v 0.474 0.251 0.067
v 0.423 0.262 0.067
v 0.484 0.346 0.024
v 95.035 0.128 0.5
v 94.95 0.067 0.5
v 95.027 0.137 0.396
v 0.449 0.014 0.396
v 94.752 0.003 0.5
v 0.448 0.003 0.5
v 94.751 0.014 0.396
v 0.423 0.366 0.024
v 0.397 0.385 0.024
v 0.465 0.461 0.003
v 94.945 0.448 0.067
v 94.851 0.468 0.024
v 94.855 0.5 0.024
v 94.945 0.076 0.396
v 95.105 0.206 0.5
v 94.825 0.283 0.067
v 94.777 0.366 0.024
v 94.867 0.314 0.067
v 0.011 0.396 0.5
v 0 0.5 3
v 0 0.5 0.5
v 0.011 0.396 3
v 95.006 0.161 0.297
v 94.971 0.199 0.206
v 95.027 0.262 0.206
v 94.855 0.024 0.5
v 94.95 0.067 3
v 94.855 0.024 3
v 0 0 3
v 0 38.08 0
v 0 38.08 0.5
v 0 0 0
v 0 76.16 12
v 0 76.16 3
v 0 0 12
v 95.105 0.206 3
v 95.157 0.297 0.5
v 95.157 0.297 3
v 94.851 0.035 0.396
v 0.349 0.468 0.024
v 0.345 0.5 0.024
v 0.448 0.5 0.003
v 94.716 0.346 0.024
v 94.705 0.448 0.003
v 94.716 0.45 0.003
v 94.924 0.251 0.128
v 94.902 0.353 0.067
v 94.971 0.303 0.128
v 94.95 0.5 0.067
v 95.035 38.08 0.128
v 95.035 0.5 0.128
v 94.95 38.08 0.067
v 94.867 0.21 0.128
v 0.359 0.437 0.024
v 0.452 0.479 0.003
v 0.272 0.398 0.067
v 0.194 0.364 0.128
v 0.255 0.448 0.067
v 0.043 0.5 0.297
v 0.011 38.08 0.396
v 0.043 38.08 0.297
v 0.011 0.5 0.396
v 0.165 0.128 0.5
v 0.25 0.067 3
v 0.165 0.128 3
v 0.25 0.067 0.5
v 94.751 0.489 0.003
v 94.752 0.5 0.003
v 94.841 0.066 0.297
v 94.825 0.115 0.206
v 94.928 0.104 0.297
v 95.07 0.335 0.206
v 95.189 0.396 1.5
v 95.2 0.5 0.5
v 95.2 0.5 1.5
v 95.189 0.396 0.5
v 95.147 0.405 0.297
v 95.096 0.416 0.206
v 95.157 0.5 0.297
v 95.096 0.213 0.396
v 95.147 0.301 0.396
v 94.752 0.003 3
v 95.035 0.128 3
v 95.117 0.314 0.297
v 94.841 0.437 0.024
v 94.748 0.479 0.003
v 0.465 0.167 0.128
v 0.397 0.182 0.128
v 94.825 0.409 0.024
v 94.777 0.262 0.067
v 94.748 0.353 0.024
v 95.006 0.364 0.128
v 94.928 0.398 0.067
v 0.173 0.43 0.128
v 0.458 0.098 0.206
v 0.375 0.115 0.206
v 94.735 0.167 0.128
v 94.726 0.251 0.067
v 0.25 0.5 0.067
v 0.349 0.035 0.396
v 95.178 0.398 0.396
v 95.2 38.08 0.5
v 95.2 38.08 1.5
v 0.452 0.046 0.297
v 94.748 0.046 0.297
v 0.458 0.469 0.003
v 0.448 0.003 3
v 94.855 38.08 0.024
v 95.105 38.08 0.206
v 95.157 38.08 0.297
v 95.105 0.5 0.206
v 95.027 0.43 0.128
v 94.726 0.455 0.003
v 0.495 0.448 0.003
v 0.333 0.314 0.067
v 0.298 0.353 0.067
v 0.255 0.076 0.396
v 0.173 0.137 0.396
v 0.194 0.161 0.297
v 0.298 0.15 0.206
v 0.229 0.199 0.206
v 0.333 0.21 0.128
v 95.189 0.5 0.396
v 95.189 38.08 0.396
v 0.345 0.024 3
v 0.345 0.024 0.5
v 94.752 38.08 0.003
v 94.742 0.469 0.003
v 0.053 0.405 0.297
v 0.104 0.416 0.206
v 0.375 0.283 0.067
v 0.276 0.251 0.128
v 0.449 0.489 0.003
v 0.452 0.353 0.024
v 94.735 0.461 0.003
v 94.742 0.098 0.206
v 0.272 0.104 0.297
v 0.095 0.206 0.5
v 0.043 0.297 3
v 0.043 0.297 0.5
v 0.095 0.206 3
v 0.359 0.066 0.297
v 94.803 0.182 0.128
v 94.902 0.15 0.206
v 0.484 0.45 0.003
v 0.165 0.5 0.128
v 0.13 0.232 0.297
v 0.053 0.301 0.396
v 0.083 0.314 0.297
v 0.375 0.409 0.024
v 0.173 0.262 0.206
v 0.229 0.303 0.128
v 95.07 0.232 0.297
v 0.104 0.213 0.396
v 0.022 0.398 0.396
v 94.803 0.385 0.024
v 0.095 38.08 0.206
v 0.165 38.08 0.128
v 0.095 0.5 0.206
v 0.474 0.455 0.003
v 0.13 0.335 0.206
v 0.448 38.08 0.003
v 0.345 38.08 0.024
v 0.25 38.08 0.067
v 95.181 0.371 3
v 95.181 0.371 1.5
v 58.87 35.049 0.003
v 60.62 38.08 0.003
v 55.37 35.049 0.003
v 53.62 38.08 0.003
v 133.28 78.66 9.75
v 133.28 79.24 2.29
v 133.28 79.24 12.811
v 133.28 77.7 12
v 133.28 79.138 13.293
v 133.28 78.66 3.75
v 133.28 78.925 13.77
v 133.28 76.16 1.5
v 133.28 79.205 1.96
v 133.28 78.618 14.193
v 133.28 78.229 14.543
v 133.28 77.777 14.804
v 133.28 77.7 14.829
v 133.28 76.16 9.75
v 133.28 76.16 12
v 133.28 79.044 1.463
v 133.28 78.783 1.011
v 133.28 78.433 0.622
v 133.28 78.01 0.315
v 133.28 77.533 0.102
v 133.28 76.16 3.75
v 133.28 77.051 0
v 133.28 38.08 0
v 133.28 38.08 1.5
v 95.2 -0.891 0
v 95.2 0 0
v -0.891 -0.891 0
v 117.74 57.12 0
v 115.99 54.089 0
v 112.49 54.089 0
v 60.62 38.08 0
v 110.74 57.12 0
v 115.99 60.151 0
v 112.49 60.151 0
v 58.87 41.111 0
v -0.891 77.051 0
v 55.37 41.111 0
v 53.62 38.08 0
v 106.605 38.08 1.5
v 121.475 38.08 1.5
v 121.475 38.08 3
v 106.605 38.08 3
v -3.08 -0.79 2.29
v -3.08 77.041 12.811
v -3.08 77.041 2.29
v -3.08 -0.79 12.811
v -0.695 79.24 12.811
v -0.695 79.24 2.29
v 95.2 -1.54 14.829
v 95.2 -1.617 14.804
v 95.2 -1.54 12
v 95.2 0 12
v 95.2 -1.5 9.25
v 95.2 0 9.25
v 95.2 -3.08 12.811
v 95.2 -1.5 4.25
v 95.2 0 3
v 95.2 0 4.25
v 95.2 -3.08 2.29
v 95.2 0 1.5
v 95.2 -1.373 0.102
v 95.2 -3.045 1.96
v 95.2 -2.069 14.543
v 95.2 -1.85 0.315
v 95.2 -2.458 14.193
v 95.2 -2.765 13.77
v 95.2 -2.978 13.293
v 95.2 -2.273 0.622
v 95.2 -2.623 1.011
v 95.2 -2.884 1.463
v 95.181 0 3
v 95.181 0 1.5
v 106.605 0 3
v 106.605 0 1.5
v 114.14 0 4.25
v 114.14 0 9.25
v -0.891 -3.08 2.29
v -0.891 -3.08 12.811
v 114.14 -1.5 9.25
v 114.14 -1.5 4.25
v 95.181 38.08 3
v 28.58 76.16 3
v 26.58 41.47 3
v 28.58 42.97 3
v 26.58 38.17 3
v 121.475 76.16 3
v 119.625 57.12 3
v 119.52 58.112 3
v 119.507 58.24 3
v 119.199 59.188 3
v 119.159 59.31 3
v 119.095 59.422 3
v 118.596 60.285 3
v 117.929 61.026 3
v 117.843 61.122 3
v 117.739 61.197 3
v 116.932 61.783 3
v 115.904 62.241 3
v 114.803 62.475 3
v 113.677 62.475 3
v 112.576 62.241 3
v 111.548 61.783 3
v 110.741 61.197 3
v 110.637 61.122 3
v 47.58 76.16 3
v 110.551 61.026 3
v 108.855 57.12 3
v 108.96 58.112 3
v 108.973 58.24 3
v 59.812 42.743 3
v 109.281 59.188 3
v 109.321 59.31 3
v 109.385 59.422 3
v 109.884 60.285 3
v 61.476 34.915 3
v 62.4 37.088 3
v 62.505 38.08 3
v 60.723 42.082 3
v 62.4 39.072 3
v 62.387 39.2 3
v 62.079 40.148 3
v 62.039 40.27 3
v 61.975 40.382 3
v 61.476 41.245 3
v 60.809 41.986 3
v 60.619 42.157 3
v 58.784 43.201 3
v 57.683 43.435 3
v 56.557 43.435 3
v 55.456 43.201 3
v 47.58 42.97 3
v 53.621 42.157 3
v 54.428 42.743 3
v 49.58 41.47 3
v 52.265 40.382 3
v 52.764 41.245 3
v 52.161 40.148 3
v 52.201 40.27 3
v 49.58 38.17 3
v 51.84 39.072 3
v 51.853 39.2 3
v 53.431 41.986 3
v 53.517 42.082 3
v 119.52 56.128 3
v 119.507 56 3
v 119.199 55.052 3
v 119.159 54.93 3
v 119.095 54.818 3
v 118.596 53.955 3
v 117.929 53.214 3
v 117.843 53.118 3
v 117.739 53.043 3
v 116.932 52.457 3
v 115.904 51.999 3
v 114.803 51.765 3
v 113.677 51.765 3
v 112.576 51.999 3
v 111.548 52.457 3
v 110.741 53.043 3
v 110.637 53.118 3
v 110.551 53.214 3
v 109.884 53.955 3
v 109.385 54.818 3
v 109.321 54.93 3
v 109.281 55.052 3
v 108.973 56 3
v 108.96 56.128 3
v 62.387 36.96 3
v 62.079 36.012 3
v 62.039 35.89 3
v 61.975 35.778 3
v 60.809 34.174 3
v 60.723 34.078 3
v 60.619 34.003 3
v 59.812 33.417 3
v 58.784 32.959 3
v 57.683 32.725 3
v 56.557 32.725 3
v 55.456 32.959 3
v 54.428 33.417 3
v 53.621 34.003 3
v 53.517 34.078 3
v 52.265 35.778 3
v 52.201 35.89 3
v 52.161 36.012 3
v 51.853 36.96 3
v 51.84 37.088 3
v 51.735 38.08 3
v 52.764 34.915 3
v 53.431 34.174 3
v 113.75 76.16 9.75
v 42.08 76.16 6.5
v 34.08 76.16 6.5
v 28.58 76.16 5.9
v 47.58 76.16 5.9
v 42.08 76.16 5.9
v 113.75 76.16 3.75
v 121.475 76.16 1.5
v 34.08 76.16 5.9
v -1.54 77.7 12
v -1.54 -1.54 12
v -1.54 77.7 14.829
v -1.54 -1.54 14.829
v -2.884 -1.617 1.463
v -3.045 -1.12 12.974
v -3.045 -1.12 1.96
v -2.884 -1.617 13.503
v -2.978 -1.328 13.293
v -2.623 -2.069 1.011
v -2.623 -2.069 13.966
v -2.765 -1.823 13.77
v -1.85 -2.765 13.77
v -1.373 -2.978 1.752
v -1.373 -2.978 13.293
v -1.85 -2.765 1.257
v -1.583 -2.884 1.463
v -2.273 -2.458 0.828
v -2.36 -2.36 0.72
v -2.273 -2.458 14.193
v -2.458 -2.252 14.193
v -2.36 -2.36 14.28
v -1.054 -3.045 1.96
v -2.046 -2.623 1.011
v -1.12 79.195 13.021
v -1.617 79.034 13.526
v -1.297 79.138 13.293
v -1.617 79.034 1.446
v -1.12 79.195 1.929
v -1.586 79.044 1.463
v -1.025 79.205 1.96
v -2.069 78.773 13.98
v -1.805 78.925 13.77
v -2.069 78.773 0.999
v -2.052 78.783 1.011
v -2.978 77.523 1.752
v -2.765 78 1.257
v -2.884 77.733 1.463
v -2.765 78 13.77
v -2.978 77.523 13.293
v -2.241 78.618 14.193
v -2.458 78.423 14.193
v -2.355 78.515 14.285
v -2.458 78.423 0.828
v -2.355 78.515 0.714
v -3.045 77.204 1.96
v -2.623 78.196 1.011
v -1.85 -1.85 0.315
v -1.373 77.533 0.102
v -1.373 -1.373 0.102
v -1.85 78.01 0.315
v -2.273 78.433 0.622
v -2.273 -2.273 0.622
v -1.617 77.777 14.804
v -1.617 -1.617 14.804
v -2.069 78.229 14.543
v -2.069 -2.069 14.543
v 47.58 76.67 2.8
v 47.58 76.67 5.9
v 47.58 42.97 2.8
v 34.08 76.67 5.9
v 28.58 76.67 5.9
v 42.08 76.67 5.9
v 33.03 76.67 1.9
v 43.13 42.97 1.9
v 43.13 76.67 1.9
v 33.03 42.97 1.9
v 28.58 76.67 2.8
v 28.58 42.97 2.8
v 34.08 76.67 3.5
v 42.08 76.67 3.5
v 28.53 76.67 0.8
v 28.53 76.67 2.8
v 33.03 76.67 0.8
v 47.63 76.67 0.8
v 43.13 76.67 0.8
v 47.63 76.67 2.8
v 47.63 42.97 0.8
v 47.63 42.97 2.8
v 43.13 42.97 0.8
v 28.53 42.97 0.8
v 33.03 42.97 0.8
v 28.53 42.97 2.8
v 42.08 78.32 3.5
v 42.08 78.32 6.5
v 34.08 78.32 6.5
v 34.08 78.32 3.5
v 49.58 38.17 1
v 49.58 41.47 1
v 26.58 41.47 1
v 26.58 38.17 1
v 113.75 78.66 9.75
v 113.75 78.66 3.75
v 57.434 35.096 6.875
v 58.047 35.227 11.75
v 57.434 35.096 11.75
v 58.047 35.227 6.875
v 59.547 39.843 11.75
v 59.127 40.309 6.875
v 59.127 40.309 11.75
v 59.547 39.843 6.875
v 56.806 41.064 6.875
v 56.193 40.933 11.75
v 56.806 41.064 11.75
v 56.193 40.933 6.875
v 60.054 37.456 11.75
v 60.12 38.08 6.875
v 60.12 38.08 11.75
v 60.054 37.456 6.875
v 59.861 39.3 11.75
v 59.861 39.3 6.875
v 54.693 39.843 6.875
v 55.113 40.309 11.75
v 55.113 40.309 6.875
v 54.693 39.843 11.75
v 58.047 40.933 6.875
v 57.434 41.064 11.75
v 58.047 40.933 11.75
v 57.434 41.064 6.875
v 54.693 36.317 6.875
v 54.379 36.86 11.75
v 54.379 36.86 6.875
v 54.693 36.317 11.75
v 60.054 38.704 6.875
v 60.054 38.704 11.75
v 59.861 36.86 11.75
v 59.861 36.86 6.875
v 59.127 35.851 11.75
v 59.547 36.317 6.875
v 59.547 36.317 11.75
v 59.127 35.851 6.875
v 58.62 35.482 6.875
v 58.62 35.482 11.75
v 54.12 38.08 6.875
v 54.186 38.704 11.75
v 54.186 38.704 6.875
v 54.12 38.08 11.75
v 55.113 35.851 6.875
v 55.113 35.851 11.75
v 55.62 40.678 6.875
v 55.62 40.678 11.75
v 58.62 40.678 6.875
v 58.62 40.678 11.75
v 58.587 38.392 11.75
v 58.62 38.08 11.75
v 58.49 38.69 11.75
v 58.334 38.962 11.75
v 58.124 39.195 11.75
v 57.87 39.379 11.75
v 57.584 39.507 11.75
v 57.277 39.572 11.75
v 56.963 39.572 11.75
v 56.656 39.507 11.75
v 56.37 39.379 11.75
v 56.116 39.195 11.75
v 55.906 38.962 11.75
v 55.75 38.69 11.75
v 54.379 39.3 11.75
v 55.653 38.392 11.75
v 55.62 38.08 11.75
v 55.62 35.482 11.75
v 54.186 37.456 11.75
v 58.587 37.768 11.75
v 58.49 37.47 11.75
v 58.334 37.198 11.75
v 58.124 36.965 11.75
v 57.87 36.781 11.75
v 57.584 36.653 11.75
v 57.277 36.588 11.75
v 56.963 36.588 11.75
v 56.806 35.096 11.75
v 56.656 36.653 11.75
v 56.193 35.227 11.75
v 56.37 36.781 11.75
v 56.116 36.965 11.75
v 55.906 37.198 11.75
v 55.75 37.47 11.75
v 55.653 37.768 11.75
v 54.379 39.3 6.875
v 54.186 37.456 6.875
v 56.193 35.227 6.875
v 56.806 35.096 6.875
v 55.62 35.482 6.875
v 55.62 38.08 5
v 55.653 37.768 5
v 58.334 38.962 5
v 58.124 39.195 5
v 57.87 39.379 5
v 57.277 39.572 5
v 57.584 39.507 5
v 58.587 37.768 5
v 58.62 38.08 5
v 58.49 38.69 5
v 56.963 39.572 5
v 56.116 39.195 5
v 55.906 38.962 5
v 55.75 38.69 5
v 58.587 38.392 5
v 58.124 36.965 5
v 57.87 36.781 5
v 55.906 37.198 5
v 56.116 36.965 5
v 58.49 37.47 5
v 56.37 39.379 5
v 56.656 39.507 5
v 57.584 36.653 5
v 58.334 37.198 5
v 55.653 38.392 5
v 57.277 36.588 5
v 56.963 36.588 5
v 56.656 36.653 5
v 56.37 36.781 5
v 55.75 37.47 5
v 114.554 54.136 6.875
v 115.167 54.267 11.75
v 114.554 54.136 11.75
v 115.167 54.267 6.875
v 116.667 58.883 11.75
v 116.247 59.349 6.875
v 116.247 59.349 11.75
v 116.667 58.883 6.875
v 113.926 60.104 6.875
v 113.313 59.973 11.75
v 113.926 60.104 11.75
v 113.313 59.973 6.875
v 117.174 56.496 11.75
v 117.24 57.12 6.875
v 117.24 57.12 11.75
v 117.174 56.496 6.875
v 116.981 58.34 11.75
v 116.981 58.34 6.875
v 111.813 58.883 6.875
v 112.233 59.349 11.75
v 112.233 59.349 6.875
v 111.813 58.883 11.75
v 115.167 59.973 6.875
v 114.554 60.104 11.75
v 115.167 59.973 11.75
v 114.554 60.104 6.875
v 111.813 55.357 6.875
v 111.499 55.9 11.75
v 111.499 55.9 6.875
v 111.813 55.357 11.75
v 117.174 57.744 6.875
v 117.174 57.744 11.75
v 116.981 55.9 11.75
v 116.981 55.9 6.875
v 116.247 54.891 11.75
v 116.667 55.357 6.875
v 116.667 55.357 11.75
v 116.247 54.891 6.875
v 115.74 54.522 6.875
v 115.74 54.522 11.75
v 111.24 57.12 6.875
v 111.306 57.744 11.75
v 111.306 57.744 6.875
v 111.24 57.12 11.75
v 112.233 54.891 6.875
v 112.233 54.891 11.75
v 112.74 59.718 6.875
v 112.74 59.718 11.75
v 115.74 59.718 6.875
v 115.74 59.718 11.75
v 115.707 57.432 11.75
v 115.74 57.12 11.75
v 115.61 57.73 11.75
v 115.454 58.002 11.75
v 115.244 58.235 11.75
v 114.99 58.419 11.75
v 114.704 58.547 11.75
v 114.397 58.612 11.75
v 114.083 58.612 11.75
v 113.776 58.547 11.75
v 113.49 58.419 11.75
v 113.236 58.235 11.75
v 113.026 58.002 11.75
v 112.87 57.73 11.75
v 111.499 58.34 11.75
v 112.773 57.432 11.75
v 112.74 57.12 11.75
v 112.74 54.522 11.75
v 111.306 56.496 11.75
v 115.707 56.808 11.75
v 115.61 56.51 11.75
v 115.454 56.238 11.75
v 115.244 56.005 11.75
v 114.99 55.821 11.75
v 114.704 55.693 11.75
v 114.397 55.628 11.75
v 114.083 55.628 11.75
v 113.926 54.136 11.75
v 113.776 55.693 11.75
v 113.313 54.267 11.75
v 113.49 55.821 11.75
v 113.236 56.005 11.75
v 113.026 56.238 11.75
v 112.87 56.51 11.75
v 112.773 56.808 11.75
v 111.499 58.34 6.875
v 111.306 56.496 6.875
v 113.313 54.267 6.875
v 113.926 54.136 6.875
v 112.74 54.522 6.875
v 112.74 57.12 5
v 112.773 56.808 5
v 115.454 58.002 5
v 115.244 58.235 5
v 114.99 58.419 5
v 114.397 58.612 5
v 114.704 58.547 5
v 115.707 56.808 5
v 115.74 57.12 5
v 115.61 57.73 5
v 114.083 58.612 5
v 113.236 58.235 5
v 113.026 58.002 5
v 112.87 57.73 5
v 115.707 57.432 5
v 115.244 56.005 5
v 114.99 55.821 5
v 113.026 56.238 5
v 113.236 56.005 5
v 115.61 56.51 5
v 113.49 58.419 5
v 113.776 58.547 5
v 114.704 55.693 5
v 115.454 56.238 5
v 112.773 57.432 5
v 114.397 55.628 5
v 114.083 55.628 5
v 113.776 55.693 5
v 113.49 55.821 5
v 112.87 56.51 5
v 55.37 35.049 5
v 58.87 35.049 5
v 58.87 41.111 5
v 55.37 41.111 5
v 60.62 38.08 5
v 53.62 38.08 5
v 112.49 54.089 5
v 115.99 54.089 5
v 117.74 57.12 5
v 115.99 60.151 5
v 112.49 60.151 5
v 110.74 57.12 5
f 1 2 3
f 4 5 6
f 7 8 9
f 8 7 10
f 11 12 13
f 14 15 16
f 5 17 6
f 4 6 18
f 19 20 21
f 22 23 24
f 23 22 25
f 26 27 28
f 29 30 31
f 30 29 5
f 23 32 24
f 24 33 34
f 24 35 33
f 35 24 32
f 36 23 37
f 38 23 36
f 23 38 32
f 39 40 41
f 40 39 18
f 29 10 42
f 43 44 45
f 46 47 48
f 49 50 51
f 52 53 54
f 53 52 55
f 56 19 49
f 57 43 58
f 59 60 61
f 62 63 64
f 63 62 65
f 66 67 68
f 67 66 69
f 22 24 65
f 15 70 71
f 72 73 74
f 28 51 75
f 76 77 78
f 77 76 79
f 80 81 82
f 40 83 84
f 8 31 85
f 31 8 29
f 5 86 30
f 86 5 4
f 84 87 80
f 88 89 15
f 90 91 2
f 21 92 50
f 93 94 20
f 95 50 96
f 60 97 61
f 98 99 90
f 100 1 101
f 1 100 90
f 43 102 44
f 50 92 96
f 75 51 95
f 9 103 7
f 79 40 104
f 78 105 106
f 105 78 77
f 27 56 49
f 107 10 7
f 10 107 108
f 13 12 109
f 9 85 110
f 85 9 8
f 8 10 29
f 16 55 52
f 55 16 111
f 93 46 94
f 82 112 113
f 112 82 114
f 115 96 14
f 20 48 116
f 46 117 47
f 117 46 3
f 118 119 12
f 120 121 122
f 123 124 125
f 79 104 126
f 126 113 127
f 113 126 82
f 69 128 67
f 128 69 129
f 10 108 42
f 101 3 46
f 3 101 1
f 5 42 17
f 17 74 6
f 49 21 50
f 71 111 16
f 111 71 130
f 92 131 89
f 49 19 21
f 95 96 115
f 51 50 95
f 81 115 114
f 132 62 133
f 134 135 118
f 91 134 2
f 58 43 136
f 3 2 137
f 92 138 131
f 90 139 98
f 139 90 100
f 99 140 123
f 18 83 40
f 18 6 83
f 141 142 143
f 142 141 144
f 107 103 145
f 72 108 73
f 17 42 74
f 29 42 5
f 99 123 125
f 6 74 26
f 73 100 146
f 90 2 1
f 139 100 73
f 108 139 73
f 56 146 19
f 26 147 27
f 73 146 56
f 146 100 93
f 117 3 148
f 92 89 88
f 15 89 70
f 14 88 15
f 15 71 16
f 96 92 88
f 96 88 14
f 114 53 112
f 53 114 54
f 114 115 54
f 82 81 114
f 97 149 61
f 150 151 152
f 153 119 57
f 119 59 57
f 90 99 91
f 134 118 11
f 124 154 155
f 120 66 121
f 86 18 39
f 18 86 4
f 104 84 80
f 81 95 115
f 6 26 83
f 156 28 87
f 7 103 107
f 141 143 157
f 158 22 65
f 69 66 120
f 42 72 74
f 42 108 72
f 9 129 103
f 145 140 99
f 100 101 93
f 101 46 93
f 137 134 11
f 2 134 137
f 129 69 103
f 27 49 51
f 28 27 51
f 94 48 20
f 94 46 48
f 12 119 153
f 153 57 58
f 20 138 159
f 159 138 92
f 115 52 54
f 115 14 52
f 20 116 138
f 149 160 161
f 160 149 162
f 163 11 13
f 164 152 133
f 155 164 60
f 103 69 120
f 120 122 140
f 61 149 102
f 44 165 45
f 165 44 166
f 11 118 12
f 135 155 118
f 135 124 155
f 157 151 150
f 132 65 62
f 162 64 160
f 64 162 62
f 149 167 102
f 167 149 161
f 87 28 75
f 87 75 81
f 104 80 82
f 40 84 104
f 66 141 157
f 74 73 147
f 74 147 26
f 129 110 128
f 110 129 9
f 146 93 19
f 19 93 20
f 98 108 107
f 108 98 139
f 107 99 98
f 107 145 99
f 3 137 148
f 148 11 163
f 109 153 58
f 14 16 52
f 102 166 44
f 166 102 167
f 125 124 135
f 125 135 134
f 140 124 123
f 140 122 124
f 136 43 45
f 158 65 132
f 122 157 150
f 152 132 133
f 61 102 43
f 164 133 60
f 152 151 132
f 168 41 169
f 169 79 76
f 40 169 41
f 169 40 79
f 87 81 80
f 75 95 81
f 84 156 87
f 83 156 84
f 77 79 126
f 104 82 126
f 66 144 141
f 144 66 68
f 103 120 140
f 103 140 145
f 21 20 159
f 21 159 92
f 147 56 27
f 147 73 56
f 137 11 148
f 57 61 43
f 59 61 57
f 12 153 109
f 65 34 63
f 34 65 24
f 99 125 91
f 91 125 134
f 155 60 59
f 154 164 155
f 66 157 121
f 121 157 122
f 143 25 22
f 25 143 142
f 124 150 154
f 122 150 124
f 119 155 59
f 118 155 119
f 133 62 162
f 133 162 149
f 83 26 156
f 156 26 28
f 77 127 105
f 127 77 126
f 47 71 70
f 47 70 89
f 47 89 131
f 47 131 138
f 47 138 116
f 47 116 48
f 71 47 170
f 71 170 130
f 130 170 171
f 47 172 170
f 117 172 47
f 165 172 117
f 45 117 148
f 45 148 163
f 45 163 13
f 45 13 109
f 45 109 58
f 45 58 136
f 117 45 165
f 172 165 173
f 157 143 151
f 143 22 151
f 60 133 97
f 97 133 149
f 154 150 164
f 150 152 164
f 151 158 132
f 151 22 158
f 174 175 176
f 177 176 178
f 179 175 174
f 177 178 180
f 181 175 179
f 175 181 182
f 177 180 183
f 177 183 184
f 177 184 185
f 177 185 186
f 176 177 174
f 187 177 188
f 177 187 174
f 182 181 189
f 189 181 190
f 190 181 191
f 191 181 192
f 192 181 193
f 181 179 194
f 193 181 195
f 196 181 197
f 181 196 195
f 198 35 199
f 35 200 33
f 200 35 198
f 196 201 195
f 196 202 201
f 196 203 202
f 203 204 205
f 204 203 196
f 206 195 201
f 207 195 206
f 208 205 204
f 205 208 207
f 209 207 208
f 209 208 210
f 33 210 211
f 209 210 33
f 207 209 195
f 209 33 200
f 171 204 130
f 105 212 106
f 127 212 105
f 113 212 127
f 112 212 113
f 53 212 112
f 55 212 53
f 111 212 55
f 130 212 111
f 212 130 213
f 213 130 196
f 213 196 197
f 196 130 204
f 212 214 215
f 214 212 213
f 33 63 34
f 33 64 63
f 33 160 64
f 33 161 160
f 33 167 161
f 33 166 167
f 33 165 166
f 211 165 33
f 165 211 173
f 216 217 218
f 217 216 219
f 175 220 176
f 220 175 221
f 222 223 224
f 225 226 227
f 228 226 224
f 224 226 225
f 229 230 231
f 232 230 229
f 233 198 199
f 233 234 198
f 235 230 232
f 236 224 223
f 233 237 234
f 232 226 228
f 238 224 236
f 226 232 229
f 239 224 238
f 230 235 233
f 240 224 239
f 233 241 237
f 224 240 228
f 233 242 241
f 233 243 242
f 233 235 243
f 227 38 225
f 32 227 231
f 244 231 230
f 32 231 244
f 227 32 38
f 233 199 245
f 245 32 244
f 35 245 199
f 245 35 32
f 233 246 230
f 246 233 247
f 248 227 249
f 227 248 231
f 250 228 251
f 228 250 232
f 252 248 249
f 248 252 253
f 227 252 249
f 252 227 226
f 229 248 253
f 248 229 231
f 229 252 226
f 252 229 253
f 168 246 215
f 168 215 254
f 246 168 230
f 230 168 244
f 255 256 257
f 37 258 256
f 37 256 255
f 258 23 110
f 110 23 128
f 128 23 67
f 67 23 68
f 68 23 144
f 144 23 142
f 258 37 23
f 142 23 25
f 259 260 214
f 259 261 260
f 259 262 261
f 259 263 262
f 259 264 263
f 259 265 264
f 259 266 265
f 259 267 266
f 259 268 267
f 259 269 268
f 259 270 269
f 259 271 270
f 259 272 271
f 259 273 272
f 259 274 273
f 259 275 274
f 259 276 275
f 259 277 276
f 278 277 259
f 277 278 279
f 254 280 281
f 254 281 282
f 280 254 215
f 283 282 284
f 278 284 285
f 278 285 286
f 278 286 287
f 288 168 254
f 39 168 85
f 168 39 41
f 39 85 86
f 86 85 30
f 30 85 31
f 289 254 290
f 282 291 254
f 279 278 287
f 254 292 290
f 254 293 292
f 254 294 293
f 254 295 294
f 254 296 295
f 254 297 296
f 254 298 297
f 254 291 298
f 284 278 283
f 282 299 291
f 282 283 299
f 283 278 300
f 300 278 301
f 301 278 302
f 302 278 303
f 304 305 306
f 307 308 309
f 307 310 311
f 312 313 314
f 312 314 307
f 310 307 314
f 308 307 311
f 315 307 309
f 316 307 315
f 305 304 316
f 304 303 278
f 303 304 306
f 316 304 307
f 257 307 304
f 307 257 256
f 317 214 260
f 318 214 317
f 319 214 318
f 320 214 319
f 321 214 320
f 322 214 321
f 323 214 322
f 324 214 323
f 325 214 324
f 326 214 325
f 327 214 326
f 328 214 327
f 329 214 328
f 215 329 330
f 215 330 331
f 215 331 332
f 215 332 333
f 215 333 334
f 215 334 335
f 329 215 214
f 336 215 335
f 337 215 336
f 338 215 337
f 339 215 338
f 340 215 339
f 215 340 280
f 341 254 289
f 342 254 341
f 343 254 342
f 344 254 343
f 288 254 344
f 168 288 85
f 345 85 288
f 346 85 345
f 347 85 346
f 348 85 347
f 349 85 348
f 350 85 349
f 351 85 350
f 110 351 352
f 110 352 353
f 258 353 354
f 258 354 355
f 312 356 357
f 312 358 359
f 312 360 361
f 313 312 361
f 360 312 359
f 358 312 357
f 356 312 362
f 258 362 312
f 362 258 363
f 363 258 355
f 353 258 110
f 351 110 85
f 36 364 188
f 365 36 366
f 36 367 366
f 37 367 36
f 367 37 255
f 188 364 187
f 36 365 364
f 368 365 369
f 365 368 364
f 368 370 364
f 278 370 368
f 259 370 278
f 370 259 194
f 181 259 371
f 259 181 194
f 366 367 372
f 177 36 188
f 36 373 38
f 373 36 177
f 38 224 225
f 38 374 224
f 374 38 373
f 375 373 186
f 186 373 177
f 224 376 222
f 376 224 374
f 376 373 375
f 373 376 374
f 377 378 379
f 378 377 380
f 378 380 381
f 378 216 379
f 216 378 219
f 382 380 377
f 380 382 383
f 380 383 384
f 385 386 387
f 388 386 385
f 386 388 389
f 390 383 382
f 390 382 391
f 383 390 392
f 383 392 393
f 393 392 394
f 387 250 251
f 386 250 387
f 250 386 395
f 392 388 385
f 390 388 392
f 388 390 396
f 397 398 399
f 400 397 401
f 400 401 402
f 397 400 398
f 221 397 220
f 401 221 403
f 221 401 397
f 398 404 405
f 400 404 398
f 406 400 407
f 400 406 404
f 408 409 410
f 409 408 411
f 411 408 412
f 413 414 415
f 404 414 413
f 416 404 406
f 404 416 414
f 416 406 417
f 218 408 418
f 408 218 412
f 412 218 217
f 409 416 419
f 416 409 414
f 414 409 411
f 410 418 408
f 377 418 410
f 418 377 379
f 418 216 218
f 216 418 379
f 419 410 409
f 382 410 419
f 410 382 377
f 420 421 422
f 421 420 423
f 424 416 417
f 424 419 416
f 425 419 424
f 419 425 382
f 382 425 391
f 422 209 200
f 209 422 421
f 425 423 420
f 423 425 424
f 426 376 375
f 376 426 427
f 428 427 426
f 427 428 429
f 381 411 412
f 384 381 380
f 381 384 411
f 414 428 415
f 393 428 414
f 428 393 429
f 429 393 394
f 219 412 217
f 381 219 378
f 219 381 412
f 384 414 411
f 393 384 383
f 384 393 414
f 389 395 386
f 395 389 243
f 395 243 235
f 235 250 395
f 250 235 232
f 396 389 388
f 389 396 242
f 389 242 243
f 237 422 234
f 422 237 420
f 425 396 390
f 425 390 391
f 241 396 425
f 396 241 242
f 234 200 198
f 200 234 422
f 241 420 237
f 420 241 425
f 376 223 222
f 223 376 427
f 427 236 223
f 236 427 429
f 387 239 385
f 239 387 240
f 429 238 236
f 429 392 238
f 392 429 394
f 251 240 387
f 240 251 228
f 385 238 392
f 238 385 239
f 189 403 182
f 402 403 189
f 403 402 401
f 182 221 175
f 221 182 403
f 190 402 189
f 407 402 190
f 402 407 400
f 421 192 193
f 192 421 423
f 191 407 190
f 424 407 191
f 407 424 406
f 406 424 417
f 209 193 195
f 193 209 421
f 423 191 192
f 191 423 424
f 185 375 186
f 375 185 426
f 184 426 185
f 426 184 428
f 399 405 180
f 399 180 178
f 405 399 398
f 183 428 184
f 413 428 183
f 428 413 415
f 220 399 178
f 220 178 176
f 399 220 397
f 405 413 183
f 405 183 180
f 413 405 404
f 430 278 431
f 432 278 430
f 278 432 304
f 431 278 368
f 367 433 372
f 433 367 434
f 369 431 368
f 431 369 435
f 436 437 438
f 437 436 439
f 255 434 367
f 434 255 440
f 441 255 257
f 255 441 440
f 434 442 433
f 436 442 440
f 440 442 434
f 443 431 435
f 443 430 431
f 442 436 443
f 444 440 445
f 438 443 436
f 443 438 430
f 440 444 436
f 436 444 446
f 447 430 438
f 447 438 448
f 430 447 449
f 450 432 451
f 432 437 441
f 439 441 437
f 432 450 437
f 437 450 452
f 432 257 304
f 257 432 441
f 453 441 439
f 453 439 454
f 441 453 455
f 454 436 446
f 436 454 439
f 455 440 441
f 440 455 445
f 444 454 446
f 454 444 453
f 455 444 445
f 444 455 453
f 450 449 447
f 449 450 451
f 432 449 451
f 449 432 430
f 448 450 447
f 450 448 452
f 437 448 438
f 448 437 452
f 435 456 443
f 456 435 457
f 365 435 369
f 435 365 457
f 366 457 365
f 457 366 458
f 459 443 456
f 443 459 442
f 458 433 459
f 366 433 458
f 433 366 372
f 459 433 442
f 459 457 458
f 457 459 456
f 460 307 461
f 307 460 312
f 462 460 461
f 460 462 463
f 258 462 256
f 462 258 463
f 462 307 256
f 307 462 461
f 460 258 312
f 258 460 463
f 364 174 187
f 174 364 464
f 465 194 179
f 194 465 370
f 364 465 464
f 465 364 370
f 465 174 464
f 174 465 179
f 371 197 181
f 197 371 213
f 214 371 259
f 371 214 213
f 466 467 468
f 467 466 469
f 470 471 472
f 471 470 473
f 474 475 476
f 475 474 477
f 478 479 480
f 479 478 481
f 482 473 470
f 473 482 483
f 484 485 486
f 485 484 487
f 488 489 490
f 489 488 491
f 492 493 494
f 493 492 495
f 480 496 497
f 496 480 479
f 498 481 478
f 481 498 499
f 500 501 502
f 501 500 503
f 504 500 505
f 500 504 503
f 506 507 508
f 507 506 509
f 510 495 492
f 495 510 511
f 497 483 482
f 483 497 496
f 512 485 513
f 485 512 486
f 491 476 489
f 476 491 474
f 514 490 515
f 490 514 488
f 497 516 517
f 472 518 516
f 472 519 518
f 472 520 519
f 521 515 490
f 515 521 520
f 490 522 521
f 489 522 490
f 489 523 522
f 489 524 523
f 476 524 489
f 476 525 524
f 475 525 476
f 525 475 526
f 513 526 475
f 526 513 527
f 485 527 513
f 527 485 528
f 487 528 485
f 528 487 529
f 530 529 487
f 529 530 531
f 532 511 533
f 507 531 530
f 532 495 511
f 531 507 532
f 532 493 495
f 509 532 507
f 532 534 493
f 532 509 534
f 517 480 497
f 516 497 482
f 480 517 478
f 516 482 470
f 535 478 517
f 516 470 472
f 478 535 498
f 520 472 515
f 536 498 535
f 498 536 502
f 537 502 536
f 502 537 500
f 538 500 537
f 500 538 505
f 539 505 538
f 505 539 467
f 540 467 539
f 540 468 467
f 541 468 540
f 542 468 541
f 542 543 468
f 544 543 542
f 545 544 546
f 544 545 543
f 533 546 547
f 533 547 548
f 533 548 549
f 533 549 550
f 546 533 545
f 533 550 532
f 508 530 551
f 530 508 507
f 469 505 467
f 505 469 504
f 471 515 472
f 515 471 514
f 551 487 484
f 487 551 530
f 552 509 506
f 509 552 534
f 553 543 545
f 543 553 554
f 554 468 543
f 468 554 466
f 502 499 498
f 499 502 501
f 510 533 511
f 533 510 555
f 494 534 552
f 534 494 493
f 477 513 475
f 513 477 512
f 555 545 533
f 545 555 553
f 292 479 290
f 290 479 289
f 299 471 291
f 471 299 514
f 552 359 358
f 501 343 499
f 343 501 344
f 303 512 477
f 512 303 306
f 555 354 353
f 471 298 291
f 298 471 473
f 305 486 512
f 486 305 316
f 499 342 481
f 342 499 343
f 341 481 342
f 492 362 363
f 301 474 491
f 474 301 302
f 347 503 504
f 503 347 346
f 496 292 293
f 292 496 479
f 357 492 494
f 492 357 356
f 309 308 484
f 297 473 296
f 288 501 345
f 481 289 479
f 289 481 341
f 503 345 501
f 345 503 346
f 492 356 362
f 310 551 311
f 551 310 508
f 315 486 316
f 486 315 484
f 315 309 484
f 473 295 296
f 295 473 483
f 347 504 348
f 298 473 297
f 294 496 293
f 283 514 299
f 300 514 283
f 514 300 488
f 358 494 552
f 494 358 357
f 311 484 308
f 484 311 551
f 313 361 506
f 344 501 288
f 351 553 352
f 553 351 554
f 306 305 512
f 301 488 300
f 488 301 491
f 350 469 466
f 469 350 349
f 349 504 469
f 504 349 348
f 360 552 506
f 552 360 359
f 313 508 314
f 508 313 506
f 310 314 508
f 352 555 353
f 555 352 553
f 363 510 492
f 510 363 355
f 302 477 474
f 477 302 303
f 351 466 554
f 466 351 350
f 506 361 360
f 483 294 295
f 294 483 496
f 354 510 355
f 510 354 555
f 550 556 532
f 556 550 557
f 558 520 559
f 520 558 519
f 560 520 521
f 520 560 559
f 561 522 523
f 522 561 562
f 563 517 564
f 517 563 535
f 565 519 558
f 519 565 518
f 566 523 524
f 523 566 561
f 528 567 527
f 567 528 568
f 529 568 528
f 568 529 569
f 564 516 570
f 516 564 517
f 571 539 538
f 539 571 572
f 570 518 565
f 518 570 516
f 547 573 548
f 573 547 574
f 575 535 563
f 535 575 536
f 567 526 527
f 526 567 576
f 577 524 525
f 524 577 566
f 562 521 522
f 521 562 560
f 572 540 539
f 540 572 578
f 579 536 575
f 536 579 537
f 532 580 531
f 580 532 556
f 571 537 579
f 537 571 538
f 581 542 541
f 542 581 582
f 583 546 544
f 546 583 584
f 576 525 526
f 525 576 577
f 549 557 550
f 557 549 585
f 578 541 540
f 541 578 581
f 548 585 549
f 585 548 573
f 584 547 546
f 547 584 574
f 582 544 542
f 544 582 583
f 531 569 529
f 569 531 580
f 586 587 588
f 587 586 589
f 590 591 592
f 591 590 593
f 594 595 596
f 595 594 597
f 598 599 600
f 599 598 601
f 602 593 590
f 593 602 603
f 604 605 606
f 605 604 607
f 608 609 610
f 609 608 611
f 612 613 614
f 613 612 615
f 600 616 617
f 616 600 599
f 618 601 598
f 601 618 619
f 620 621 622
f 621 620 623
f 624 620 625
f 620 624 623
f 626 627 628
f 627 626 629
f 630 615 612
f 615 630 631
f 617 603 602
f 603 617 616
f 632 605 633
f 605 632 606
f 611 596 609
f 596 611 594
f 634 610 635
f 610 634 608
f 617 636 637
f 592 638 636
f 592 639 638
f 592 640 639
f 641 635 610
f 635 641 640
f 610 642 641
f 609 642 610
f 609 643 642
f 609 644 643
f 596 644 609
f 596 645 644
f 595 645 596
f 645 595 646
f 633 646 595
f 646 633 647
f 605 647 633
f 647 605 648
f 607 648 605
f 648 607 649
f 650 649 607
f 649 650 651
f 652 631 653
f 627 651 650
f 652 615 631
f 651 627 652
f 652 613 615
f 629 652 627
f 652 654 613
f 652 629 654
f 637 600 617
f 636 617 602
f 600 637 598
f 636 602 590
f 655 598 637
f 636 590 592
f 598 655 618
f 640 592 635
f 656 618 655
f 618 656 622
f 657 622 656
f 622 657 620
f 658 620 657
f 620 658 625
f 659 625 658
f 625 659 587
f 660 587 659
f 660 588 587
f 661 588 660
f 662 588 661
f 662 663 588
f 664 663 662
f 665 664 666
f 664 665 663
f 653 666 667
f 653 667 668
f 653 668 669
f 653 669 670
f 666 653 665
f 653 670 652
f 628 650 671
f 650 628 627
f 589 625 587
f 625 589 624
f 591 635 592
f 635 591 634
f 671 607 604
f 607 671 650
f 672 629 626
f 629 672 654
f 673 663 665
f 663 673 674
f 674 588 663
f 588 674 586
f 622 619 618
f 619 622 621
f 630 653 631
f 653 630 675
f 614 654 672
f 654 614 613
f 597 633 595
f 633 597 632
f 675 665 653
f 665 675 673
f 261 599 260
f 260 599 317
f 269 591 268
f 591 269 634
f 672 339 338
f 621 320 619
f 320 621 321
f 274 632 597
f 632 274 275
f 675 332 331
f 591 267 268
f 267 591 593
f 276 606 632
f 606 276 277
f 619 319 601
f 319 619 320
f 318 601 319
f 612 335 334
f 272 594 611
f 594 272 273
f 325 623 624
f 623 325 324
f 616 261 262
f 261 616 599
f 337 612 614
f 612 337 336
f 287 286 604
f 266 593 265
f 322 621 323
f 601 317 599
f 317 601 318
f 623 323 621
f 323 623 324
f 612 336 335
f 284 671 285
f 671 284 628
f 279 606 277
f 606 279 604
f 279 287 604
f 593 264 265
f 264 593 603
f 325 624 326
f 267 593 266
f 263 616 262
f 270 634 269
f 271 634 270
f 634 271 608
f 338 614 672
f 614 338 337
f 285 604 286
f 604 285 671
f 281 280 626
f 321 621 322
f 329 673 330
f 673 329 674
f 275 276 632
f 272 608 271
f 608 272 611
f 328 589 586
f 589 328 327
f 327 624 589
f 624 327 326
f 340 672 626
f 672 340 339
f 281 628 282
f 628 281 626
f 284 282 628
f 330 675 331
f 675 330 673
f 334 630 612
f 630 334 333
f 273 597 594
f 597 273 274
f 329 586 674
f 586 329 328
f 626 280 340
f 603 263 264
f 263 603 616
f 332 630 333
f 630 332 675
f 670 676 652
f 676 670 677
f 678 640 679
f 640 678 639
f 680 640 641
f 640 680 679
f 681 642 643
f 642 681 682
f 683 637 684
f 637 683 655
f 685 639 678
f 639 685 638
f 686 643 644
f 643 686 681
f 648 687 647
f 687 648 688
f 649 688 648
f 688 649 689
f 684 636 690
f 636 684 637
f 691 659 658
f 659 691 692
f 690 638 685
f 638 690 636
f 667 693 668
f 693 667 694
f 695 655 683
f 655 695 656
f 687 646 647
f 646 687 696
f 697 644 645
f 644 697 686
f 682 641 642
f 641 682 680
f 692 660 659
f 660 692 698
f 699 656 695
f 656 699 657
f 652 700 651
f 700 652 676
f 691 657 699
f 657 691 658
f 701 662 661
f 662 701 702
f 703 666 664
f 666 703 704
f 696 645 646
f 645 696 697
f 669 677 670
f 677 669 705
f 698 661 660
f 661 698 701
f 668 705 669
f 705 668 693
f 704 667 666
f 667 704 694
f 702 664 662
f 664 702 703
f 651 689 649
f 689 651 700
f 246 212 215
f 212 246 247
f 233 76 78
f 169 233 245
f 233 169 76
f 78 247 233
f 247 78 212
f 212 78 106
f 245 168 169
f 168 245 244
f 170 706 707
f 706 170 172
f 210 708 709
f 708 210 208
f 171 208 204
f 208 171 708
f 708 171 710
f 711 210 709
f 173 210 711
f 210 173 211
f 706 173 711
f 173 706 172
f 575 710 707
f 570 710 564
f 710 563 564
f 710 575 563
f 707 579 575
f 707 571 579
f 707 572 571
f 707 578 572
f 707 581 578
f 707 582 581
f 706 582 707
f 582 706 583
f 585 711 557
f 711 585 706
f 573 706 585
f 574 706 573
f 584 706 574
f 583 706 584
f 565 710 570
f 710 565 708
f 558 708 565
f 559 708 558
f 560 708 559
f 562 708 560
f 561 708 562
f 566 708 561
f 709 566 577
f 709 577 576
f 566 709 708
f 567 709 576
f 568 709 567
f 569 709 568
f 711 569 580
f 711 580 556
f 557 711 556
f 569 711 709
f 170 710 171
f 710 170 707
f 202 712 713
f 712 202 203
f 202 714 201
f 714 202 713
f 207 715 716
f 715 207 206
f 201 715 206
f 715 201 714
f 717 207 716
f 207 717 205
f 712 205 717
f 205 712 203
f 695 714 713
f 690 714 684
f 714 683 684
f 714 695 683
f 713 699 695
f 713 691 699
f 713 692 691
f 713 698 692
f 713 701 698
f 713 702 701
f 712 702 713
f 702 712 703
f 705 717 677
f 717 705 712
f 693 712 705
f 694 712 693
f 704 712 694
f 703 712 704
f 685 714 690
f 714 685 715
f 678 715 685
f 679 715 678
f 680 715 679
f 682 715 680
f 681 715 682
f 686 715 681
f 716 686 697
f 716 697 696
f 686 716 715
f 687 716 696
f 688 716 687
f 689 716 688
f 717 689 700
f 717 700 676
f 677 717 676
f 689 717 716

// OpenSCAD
showSwitchCut=true;
showSwitch=true;
showKeyCap=false;
showSpaceBox=false;
fullboard=false;
space=19.04;

/*[Cherry MX settings]*/
cherryCutOutSize=13.9954;
cherrySize=14.58;

/*[Keeb]*/
keyCols = 12;
keyRows = 4;
keySpace = space-cherrySize;
edgeSpaceAddition = 3;
edgeSpace = (edgeSpaceAddition*2)-keySpace;
keyZ = -1;

function size(q) = (keySpace*q)
                        +cherrySize
                        *(q-1)
                        +cherrySize;
function Qsize(q) = (edgeSpace+edgeSpaceAddition)
              +(keySpace*q)
              +cherrySize
              *(q-1)
              +cherrySize;
          
moduleX = size(keyCols);
moduleY = size(keyRows);
moduleZ = 3;

$fn=30;
$fs=0.15;
mSize=3;


/*[ Printer settings ]*/
showPrintBox=false;
printerSize=[140,140,140];

// mX: h=mX-1, d= X*(1+((1/3)*2))
function mNutH(m) = m-1;
function mNutD(m) = m*(1+((1/3)*2));
function mNutDHole(m) = mNutD(m)+2;
function mScrewheadH(m) = m-1;
function mScrewheadD(m) = m+2; // This is most probably not correct, but works for m3

          
function position(x,y,z) = [space*(x-1), space*(y-1), z];



///////////////////////////////
//  Lib modules
//////////////////////////////

// ---- Key related "libs" ----
module cherrySwitch(){
	// Awesome Cherry MX model created by gcb
	// Lib: Cherry MX switch - reference
	// Download here: https://www.thingiverse.com/thing:421524
	//  p=cherrySize/2+0.53;
	#translate([cherryCutOutSize/1.5,cherryCutOutSize/1.5,13.32])
		import("switch_mx.stl");
}
module cherryCap(x=cherryCutOutSize/1.36,y=cherryCutOutSize/1.36,z=4, capSize=1, homing=false,rotateCap=false){
	// Awesome caps created by rsheldiii
	// Lib: KeyV2: Parametric Mechanical Keycap Library
	// Download here: https://www.thingiverse.com/thing:2783650

  capRotation = rotateCap ? 90 : 0;

	if(capSize == 1){
		translate([x-0.819,y-0.8,z+3.5])rotate([0,0,capRotation]){
      if(homing){
        rotate([0,0,180])import("keycap-dsa-1.0-row3-homing-cherry.stl");
      } else {
        import("keycap-dsa-1.0-row3-cherry.stl");
      }
    }
	} else if(capSize==1.25){

		translate([x-0.819,y-0.8,z+3.5])
    rotate([0,0,capRotation])
			import("keycap-dsa-1.25-row3-cherry.stl");
	}
}

module proMicro(pins=true){
  #translate([size(2),size(keyRows-1)+2.2,moduleZ-0.6])
  if(pins){
    import("pro-micro_wpins.stl");
  } else {
    import("pro-micro.stl");
  }
}

module proMicroHolder(type="holder"){
  translate([size(2),size(keyRows-1)+2.7,moduleZ])
  if(type == "holder"){
    difference(){
      import("pro-micro-holder_base.stl");
//      translate([0,-2.25,1.5])cube([23,38.5,3],center=true);
    }
  } else if(type == "cutout"){
    union(){
      translate([0,0,0.9])cube([19,33.7,4], center=true);
      translate([-7.3,0,-1.2])cube([4.5,33.7,2], center=true);
      translate([7.3,0,-1.2])cube([4.5,33.7,2], center=true);
      translate([0,17,2])cube([8,3,3], center=true);
      translate([0,-20,-0.5])cube([23,3.3,3],center=true);
    }
  } else if(type == "lid"){
    union(){
      translate([0,-3,2.8])cube([10,32,1],center=true);
      translate([0,-18,2])cube([22,2,2.6],center=true);
    }
  }
}

// ---- Keyboard basics ----
module mxSwitchCut(x=cherryCutOutSize/1.5,y=cherryCutOutSize/1.5,z=0,rotateCap=false){
  capRotation = rotateCap ? 90 : 0;
  d=14.05;
  p=14.58/2+0.3;
  translate([x,y,z]){
    translate([0,0,-3.7])
    rotate([0,0,capRotation]){
      difference(){
        cube([d,d,10], center=true);
        translate([d*0.5,0,0])cube([1,4,12],center=true);
        translate([-d*0.5,0,0])cube([1,4,12],center=true);
      }


      translate([0,-(p-0.6),1.8]) rotate([-10,0,0]) cube([cherryCutOutSize/2,1,1.6],center=true);
      translate([0,-(p-0.469),-1.95]) cube([cherryCutOutSize/2,1,6.099],center=true);

      translate([0,(p-0.6),1.8]) rotate([10,0,0]) cube([cherryCutOutSize/2,1,1.6],center=true);
      translate([0,(p-0.469),-1.95]) cube([cherryCutOutSize/2,1,6.099],center=true);
    }
  }
}



module repeated (yStart, yEnd, xStart, xEnd, yStep=1, xStep=1){
  union(){
    for(y = [yStart:yStep:yEnd]){
      for(x = [xStart:xStep:xEnd]){
        translate(position(x,y,keyZ)) children();
      }
    }
  }
}

module roundedCube(size=[1,1,1],r=0.5){
  tMin = r;
  txMax = size[0] - r;
  tyMax = size[1] - r;
  tzMax = size[2] - r;
  
  hull(){
    translate([tMin,tMin,tMin])sphere(r=r);
    translate([tMin,tMin,tzMax])sphere(r=r);
    
    
    
    translate([txMax,tMin,tMin])sphere(r=r);
    translate([txMax,tMin,tzMax])sphere(r=r);
    
    
    translate([tMin,tyMax,tMin])sphere(r=r);
    translate([tMin,tyMax,tzMax])sphere(r=r);
    
    translate([txMax,tyMax,tMin])sphere(r=r);
    translate([txMax,tyMax,tzMax])sphere(r=r);
    
    
    
    
    
//    for(tx = [tMin, txMax]){
//      for(ty = [tMin, tyMax]){
//        for(tz = [tMin, tzMax]){
//          translate([tx, ty, tz])
//            sphere(r=r);
//        }
//      }
//    }
  }
}
  

///////////////////////////////
//  This
//////////////////////////////

module roundCorner(h=10,d=10){
  union(){
    rotate([0,0,180])difference(){
      translate([0,0,-0.5])cube([d,d,h+1]);
      translate([0,0,-1])cylinder(d=d,h=h+2);
    }
  }
}

module roundEdge(d=5){
  difference(){
    translate([0,0,-d])sphere(d);
    sphere(d*1.5);
  }
}

module screwHoles(ri,h,ri2,wedgeHole=false){
  ri2 = is_undef(ri2) ? ri : ri2;
  repeated(2,keyRows,2,keyCols/2-1,2,2) 
    cylinder(h=h,d1=ri2,d2=ri, center=true);
  
  if(wedgeHole){
    repeated(keyRows,keyRows, keyCols/2+1, keyCols/2+1,2,2)
      cylinder(h=h,d1=ri2,d2=ri,center=true);
  }
}

module points(wedge=false){
  repeated(keyRows/2+1,keyRows,4,keyCols/2-1,2,3) children();
  
  if(wedge){
    repeated(keyRows,keyRows, keyCols/2+1, keyCols/2+1,2,2) children();
  }
}

module topPlateNoCuts(){
  difference(){
    union(){
      cube([size((keyCols/2)-1),size(keyRows),moduleZ]);
      translate(position(1,keyRows/2+1,0))cube([size((keyCols/2)+1),size(keyRows/2),moduleZ]);
      
      translate([0,size(keyRows),0])
        cube([size((keyCols/2)+1),edgeSpace, moduleZ]);
      
      translate([0,-edgeSpace,0])
        cube([size((keyCols/2)-1),edgeSpace, moduleZ]);
      
      
      translate([-edgeSpace,-edgeSpace,0])
        cube([edgeSpace,size(keyRows)+edgeSpace*2, moduleZ]);
      
      translate(position(keyCols/2,1,0))
        translate([0,-edgeSpace,0])
          cube([2,size(2)+edgeSpace,moduleZ/2]);
    }
    
    translate(position(keyCols/2+2,3,0))
      translate([-2,0,0])
        cube([2,size(2)+edgeSpace,moduleZ/2]);
  }
}

module top(){
  difference(){
    topPlateNoCuts();
     
    if(showSwitchCut){
      translate([0,0,3.5]){
        repeated(1,keyRows,1,keyCols) mxSwitchCut();
      }
    }
    
    points(true){
      cylinder(h=10,d=mSize*1.1,center=true);
      translate([0,0,moduleZ-0.5])cylinder(h=2.2, d1=mSize*1.1, d2=mNutD(mSize)*1.21,center=true);
      translate([0,0,moduleZ+1.1])cylinder(h=1.01,d=mNutD(mSize)*1.21,center=true);
    }
    
  }
  
  if(showSwitch){
    translate([0,0,3.5]){
      repeated(1,keyRows/2,1,keyCols/2+1) cherrySwitch();
      repeated(keyRows/2,keyRows,1,keyCols/2-1) cherrySwitch();
    }
  }
  if(showKeyCap){
    translate([0,0,3.5]){
      repeated(1,keyRows/2,1,keyCols/2+1) cherryCap();
      repeated(keyRows/2,keyRows,1,keyCols/2-1) cherryCap();
    }
  }
}

module bottom(z=15){
  module topPlate(){
    scale([1,1,1.1])topPlateNoCuts();
  }
  module latch(extra=0,extraV=0){
    translate([(size(1)+extra)/2
              , (1.5+extra)/2
              , ((z/2+extra)/2)-extra/2
              ])
      cube([size(1)+extra,1.5+extra,z/3+extra+extraV],center=true);
  }
  
  module rounding(){
    translate([-0.6,-0.6,0])roundCorner(z,d=5);
    
    translate([-0.6,-0.95+size(keyRows)+edgeSpace,0])
      rotate([0,0,-90])
        roundCorner(z,d=5);
    
    // side
    translate([0,size(keyRows+0.5),3.08])
      rotate([90,0,0])
        translate([-0.6,-0.6,0])
          roundCorner(size(keyRows+1),d=5);
    
    translate([0,size(keyRows+0.5),z-3.08])
      rotate([90,90,0])
        translate([-0.6,-0.6,0])
          roundCorner(size(keyRows+1),d=5);
    
    // front
    translate([-size(1),0,3.08])
      rotate([90,0,90])
        translate([-0.6,-0.6,0])
          roundCorner(size(keyCols/2+1),d=5);
    
    translate([-size(1),0,z-3.08])
      rotate([90,90,90])
        translate([-0.6,-0.6,0])
          roundCorner(size(keyCols/2+1),d=5);
    
    // back
    translate([size(keyCols/2+2),size(keyRows),3.08])
      rotate([90,0,270])
        translate([-0.6,-0.6,0])
          roundCorner(size(keyCols/2+3),d=5);
          
    translate([size(keyCols/2+2),size(keyRows),z-3.08])
      rotate([90,90,270])
        translate([-0.6,-0.6,0])
          roundCorner(size(keyCols/2+3),d=5);
  }
  
  difference(){
    union(){
      difference(){
        union(){
          roundedCube([size((keyCols/2)-1),size(keyRows),z]);
          translate([0,size(keyRows/2),0])
            cube([size((keyCols/2)+1),size(keyRows/2),z]);
          
          translate([-edgeSpace*2,size(keyRows),0])
            cube([size((keyCols/2)+1)+edgeSpace*2,edgeSpace*2, z]);
          
          translate([-edgeSpace*2,-edgeSpace*2,0])
            cube([size((keyCols/2)-1)+edgeSpace*2,edgeSpace*2, z]);
          
          translate([-edgeSpace*2,-edgeSpace*2,0])
            cube([edgeSpace*2,size(keyRows)+edgeSpace*4, z]);
          
          translate([size(keyCols/2-1)-0.1,-1.5,moduleZ])latch();
        }
        
        translate([0,0,moduleZ])union(){
          cube([size((keyCols/2)-1),size(keyRows),z]);
          translate([0,size(keyRows/2),0])
            cube([size((keyCols/2)+1),size(2),z]);
        }

        
        translate([0,0,z-moduleZ])topPlate();
        translate([3,0,z-moduleZ])topPlate();
        
        rounding();
        
        
        translate([size(keyCols/2)-0.49,size(keyRows),moduleZ])latch(extra=1,extraV=0);
        
        proMicroHolder("cutout");
        
        translate(position(keyCols/2+1.38,3,moduleZ/2))cube([size(0.62),size(keyRows/2),moduleZ/2]);
      }
      translate(position((keyCols/2)-0.001,1,moduleZ/2))cube([size(0.6),size(keyRows/2),moduleZ/2]);
      
      translate([0,0,moduleZ])points(true)mount(z-moduleZ*1.75);
    }
    points(true)cylinder(d=mNutDHole(mSize),h=6,$fn=6);
//    translate([size(0),size(3),-2])cube([40,40,20]);
  }
}

module mount(h,m=mSize){
  translate([0,0,h/4])
  difference(){
    union(){
      translate([0,0,h/4])cylinder(h=h,d=m*2,center=true);
      cylinder(h=h/2,d1=m*4,d2=m*2,center=true);
    }
    translate([0,0,h/4])cylinder(h=h+2,d=m,center=true);
  }
}


module half(h){
//  translate([0,size(keyRows),h-moduleZ])mirror([0,1,0])top();
  bottom(h);
}


translate([0,0,0]){
  half(15);
//  roundedCube(size=[size(4),size(7),15],r=2);
  
//  connector(15);
//  translate([40,-10,0])connector(15,1);
//  mount(h=15,m=mSize);
  
//  translate([size(keyCols),size(keyRows),0])rotate([0,0,180])half(15);
}

//echo(3);
//echo(mNutD(6));

//roundEdge();
if(showPrintBox)#cube(printerSize);
//proMicro(false);
//proMicro();
//#proMicroHolder();
//proMicroHolder("cutout");
